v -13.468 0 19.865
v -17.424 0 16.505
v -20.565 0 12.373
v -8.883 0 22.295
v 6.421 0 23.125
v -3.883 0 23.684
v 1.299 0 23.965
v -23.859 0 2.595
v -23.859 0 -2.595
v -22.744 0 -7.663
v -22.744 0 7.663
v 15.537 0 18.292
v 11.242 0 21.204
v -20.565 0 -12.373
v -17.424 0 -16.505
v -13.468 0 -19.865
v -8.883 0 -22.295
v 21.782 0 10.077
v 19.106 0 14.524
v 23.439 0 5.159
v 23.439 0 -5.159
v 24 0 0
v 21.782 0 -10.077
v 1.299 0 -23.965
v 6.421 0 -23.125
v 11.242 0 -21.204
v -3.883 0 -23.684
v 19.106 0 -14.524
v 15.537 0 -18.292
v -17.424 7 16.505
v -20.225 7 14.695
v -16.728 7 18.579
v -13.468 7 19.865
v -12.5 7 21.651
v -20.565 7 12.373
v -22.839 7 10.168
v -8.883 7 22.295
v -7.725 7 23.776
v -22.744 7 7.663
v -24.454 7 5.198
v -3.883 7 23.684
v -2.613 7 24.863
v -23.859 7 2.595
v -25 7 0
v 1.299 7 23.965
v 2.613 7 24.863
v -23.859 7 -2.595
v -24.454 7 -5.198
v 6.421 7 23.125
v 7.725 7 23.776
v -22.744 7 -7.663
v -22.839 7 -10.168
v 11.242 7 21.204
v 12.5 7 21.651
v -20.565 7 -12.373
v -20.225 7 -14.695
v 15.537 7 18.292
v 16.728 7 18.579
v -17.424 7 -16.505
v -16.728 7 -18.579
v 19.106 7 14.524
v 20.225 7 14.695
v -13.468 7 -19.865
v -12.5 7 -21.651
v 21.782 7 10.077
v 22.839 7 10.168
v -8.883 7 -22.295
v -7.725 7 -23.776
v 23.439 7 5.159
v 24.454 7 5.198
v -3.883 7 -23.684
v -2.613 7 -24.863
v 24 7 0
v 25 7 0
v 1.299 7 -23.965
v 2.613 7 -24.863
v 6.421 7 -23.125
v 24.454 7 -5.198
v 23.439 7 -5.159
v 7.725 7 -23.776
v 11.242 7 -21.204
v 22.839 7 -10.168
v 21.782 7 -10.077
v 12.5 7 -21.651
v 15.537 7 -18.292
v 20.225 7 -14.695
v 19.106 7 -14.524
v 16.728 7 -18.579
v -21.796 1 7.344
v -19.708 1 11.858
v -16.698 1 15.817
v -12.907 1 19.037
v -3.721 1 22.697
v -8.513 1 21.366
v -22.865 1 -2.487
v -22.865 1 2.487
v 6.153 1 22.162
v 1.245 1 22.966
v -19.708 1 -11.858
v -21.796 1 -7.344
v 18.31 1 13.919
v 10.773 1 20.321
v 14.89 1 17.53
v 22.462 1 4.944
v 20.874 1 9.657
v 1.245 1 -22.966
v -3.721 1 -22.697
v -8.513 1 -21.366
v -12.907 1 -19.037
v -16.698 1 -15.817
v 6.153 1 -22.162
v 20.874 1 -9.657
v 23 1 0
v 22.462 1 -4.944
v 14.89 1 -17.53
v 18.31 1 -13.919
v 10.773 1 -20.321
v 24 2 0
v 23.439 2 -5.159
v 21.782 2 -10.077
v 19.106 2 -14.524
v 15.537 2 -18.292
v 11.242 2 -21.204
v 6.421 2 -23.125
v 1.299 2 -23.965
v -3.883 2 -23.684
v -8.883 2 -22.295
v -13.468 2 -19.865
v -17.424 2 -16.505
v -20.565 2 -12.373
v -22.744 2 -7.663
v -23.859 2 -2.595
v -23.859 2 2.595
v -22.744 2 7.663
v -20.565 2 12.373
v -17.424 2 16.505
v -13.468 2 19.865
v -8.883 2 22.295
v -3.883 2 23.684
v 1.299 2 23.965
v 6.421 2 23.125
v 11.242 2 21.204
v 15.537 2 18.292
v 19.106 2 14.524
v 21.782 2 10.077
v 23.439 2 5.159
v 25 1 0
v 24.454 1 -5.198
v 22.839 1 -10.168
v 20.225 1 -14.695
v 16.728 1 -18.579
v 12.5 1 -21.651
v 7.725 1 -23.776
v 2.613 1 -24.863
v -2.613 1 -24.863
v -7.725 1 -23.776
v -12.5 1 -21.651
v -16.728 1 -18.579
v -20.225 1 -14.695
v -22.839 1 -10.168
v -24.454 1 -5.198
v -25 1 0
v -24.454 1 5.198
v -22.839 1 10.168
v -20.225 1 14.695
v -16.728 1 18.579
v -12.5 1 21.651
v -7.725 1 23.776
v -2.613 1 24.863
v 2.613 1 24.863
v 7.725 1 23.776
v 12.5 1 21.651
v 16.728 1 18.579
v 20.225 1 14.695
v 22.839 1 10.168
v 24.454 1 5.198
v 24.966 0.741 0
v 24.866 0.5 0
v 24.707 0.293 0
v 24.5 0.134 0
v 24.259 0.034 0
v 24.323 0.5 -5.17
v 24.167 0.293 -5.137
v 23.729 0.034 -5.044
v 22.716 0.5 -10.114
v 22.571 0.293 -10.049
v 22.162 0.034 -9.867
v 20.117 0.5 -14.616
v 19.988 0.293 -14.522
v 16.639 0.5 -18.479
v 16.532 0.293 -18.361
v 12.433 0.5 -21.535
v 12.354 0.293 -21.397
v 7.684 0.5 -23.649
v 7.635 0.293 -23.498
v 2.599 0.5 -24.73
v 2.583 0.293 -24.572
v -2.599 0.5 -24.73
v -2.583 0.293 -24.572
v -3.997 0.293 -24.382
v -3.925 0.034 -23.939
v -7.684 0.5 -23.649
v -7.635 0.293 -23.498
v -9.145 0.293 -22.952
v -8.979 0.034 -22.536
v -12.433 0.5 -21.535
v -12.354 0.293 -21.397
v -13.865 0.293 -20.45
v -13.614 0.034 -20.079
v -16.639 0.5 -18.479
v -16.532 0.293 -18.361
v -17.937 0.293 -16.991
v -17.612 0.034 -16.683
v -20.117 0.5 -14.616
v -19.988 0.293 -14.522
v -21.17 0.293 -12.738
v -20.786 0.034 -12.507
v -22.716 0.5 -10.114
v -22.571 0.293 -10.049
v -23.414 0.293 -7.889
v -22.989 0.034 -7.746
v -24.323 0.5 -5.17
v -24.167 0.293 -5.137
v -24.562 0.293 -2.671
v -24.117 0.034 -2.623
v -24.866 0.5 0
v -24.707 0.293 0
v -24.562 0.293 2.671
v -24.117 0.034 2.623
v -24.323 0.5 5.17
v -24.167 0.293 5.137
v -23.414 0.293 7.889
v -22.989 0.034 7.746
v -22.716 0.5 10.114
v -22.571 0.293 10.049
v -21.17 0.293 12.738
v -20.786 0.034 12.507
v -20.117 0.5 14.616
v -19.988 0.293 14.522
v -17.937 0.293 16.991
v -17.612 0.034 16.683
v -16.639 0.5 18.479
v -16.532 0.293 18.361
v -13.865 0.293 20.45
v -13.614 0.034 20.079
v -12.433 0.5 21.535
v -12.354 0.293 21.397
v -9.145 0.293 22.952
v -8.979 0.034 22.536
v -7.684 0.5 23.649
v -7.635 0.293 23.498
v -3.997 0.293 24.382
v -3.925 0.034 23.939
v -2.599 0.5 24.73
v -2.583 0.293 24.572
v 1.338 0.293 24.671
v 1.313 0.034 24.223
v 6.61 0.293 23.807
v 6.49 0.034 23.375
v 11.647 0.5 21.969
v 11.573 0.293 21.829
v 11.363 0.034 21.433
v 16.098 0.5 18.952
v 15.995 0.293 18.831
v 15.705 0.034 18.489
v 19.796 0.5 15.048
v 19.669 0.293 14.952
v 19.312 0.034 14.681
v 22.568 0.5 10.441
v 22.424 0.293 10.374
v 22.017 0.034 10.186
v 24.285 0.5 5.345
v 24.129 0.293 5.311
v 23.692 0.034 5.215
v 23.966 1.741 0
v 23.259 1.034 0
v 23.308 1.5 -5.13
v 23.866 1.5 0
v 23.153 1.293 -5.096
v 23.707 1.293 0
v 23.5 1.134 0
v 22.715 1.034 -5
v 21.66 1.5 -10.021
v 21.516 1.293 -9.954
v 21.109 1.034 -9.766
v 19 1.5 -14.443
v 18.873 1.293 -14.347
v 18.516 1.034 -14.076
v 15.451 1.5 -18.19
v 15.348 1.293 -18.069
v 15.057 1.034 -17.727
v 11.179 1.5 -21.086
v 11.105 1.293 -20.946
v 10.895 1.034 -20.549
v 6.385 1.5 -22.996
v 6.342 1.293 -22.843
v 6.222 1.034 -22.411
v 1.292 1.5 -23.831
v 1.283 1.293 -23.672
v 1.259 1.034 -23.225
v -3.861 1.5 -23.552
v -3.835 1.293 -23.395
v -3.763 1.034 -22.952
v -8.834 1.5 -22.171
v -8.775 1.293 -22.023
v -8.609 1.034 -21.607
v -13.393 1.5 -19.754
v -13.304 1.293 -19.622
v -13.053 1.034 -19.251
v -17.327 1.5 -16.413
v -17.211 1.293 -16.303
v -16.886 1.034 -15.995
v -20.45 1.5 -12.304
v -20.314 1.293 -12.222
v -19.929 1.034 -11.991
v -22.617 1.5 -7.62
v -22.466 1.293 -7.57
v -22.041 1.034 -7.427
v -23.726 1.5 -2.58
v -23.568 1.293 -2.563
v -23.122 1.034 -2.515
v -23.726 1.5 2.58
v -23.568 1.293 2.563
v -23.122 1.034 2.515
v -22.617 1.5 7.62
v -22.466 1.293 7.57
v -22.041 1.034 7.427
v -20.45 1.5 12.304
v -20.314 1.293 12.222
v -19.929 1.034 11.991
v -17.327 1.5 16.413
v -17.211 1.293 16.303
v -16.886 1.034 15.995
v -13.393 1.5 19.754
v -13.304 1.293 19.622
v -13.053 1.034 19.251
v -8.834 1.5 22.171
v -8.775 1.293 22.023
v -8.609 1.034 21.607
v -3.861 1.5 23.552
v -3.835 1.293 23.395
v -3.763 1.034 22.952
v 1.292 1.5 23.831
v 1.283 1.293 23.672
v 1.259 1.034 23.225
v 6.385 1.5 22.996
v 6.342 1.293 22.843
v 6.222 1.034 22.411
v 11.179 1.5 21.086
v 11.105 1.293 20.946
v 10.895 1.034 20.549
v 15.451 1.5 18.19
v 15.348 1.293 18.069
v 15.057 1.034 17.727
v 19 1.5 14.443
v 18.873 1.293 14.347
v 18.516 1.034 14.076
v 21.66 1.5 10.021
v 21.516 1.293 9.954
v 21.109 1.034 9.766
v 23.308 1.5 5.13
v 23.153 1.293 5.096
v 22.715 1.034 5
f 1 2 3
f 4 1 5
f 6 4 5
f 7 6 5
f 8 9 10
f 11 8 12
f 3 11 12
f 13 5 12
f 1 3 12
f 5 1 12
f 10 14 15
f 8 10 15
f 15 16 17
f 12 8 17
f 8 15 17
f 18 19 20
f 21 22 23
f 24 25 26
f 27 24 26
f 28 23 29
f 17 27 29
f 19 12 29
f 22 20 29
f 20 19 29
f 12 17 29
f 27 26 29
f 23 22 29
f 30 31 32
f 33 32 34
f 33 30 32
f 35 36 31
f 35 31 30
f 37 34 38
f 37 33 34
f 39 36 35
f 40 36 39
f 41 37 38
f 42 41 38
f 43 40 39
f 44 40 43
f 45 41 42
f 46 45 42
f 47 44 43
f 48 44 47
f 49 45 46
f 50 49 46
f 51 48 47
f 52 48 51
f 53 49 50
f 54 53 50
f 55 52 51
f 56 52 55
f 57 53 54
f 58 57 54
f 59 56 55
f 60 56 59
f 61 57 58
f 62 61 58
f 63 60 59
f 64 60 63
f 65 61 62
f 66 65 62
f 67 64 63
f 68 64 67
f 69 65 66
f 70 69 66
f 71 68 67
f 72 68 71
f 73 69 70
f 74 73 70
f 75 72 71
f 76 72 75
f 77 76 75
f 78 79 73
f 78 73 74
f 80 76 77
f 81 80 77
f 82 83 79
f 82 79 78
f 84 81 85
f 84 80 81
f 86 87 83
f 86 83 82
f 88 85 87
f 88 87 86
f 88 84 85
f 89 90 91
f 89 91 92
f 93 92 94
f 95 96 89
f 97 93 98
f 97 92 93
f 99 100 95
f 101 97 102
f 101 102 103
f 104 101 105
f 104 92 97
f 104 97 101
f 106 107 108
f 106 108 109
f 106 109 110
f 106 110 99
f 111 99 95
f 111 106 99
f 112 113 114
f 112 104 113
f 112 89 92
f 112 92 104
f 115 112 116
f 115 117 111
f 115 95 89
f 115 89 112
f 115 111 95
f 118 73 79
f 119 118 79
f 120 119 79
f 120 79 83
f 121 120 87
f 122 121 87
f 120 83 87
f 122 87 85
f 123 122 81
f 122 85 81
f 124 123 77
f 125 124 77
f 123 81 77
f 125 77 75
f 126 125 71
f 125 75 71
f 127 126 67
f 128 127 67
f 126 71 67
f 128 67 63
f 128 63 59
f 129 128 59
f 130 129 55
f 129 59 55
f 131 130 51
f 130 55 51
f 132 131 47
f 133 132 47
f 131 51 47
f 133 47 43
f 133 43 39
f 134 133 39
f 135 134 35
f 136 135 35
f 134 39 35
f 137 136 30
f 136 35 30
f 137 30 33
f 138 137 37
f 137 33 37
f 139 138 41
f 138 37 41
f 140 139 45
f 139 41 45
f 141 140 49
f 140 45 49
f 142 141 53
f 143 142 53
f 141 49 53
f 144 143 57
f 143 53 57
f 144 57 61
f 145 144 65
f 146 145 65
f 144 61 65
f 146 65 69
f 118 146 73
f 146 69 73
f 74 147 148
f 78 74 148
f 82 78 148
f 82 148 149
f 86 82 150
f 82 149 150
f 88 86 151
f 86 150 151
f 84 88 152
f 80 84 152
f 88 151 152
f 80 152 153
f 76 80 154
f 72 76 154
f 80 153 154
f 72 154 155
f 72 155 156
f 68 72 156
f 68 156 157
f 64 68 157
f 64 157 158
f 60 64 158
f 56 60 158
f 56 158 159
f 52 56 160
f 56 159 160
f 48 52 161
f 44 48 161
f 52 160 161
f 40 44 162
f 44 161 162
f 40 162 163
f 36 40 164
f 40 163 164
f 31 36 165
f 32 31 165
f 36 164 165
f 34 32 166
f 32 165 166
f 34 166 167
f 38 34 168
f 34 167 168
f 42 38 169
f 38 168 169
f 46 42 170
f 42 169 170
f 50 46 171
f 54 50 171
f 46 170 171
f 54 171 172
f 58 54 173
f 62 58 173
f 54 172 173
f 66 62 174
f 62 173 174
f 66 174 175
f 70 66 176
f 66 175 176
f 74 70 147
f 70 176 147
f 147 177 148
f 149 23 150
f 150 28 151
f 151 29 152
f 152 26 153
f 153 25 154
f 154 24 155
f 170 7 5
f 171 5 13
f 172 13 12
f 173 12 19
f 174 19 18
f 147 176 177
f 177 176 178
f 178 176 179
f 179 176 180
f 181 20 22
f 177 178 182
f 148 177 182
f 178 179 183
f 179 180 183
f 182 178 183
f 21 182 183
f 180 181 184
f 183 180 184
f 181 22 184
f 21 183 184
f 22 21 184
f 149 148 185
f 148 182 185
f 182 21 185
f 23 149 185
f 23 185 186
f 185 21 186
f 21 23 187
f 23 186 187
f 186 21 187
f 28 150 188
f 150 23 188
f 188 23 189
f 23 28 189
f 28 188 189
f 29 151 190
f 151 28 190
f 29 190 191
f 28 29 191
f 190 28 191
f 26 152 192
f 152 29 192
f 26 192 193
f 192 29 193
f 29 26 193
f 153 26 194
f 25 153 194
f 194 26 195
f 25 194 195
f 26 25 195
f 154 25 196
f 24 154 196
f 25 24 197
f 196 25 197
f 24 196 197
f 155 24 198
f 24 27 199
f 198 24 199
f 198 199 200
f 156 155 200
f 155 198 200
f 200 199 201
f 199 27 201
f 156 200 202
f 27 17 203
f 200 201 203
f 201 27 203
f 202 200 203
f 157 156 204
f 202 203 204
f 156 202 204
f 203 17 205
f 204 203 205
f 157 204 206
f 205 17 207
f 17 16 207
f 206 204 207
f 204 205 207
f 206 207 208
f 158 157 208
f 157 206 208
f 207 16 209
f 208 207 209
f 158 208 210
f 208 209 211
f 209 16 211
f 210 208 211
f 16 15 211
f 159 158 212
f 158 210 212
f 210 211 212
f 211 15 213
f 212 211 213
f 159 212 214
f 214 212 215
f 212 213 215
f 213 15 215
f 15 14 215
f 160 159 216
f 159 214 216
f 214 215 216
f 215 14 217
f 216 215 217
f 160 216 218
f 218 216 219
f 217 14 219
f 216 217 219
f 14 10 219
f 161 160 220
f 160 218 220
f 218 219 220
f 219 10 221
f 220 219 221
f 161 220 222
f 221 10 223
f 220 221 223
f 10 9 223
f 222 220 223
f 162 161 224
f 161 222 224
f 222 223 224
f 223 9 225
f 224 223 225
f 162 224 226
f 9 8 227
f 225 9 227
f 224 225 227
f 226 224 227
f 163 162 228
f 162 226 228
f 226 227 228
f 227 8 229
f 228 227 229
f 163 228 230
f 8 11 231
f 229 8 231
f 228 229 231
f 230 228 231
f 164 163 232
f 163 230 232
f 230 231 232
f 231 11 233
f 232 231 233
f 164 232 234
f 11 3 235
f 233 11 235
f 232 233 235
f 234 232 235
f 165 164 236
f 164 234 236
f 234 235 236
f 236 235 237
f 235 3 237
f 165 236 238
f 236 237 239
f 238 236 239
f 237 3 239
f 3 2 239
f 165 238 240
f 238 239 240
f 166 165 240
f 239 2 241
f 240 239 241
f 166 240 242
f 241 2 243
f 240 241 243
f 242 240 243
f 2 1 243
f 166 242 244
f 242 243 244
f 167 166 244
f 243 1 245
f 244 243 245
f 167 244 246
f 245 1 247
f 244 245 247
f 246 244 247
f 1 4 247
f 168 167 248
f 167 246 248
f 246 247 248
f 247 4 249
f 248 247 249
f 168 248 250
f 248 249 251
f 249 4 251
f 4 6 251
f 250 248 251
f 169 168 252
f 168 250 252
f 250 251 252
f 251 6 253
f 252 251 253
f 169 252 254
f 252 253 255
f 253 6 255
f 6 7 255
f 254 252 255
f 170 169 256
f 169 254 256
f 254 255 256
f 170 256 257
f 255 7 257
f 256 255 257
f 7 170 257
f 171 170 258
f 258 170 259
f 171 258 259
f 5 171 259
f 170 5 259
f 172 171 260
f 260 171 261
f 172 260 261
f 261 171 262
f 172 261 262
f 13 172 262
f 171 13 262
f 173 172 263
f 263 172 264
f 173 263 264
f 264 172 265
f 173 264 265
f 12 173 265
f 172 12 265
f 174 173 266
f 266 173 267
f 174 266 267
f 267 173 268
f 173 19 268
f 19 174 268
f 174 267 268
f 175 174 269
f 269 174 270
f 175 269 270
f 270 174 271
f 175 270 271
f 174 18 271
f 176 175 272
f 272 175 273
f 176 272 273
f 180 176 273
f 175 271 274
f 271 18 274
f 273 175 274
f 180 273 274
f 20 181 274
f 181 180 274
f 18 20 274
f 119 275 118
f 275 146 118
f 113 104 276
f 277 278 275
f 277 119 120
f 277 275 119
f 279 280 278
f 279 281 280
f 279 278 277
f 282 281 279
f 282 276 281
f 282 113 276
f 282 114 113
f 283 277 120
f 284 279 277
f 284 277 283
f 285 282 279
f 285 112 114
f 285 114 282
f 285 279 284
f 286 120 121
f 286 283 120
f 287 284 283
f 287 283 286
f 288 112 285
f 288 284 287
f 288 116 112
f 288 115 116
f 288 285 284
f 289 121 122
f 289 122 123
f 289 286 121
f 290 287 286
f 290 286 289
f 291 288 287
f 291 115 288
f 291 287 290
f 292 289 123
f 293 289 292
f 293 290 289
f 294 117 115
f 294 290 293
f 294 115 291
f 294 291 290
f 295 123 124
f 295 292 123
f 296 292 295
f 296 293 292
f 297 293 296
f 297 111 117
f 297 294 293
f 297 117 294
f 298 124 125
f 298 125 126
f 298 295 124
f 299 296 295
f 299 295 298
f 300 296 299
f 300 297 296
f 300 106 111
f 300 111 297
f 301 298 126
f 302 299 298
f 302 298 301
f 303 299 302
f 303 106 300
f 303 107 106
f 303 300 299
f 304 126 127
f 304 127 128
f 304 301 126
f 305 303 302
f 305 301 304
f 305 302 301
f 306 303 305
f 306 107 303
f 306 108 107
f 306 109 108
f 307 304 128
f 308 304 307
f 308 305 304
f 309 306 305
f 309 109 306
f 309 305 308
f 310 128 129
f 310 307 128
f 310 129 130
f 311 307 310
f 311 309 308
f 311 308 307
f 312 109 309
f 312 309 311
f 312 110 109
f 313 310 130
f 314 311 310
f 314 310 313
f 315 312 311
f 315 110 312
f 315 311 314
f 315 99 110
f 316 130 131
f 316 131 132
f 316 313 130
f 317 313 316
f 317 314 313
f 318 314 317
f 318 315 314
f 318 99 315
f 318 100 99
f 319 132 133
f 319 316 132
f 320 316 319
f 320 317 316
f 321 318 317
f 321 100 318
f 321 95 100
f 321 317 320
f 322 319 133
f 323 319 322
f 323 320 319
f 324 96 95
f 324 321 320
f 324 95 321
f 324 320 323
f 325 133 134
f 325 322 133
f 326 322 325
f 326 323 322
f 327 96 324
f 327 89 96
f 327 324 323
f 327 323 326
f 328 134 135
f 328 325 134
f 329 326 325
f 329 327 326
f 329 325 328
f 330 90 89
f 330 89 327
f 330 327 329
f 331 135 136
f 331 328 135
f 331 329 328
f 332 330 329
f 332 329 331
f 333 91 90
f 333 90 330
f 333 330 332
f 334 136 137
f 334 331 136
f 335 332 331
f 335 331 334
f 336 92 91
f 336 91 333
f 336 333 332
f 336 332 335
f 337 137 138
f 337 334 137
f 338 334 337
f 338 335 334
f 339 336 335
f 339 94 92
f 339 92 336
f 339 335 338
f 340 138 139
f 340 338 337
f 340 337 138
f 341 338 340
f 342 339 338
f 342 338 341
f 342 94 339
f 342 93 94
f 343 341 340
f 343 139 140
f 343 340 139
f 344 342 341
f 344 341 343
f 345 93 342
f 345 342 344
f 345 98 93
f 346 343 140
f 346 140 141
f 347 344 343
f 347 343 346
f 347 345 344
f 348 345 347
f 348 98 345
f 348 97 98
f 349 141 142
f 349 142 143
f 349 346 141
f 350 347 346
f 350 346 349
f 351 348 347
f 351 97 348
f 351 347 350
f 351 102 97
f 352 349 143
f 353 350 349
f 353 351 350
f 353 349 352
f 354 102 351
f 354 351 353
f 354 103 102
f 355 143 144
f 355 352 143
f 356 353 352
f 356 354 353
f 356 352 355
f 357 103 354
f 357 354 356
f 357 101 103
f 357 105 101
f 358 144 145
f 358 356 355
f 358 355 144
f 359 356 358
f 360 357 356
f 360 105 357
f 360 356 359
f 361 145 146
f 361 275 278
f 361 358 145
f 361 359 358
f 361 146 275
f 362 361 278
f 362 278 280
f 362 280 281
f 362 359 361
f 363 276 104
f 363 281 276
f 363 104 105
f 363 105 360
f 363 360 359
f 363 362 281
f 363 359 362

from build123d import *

# Parameters (mm, degrees)
SKETCH1_R           = 25
BOSS_EXTRUDE1_DEPTH = 7
SKETCH2_R           = 24
CUT_EXTRUDE1_DEPTH  = 6
FILLET1_R           = 1


with BuildPart() as part:
    # Sketch1 → Boss-Extrude1 (new body)
    with BuildSketch(Plane(origin=(0, 0, 0), x_dir=(1, 0, 0), z_dir=(0, 1, 0))):
        Circle(SKETCH1_R)
    extrude(amount=BOSS_EXTRUDE1_DEPTH)

    # Sketch2 → Cut-Extrude1 (cut)
    with BuildSketch(Plane(origin=(0, 7, 0), x_dir=(1, 0, 0), z_dir=(0, 1, 0))):
        Circle(SKETCH2_R)
    extrude(amount=-CUT_EXTRUDE1_DEPTH, mode=Mode.SUBTRACT)

    # Fillet1
    fillet1_edges = [part.edges().sort_by_distance(p)[0] for p in [
        (-25, 0, 0),
        (-24, 1, 0),
    ]]
    fillet(fillet1_edges, radius=FILLET1_R)


solid = part.part
